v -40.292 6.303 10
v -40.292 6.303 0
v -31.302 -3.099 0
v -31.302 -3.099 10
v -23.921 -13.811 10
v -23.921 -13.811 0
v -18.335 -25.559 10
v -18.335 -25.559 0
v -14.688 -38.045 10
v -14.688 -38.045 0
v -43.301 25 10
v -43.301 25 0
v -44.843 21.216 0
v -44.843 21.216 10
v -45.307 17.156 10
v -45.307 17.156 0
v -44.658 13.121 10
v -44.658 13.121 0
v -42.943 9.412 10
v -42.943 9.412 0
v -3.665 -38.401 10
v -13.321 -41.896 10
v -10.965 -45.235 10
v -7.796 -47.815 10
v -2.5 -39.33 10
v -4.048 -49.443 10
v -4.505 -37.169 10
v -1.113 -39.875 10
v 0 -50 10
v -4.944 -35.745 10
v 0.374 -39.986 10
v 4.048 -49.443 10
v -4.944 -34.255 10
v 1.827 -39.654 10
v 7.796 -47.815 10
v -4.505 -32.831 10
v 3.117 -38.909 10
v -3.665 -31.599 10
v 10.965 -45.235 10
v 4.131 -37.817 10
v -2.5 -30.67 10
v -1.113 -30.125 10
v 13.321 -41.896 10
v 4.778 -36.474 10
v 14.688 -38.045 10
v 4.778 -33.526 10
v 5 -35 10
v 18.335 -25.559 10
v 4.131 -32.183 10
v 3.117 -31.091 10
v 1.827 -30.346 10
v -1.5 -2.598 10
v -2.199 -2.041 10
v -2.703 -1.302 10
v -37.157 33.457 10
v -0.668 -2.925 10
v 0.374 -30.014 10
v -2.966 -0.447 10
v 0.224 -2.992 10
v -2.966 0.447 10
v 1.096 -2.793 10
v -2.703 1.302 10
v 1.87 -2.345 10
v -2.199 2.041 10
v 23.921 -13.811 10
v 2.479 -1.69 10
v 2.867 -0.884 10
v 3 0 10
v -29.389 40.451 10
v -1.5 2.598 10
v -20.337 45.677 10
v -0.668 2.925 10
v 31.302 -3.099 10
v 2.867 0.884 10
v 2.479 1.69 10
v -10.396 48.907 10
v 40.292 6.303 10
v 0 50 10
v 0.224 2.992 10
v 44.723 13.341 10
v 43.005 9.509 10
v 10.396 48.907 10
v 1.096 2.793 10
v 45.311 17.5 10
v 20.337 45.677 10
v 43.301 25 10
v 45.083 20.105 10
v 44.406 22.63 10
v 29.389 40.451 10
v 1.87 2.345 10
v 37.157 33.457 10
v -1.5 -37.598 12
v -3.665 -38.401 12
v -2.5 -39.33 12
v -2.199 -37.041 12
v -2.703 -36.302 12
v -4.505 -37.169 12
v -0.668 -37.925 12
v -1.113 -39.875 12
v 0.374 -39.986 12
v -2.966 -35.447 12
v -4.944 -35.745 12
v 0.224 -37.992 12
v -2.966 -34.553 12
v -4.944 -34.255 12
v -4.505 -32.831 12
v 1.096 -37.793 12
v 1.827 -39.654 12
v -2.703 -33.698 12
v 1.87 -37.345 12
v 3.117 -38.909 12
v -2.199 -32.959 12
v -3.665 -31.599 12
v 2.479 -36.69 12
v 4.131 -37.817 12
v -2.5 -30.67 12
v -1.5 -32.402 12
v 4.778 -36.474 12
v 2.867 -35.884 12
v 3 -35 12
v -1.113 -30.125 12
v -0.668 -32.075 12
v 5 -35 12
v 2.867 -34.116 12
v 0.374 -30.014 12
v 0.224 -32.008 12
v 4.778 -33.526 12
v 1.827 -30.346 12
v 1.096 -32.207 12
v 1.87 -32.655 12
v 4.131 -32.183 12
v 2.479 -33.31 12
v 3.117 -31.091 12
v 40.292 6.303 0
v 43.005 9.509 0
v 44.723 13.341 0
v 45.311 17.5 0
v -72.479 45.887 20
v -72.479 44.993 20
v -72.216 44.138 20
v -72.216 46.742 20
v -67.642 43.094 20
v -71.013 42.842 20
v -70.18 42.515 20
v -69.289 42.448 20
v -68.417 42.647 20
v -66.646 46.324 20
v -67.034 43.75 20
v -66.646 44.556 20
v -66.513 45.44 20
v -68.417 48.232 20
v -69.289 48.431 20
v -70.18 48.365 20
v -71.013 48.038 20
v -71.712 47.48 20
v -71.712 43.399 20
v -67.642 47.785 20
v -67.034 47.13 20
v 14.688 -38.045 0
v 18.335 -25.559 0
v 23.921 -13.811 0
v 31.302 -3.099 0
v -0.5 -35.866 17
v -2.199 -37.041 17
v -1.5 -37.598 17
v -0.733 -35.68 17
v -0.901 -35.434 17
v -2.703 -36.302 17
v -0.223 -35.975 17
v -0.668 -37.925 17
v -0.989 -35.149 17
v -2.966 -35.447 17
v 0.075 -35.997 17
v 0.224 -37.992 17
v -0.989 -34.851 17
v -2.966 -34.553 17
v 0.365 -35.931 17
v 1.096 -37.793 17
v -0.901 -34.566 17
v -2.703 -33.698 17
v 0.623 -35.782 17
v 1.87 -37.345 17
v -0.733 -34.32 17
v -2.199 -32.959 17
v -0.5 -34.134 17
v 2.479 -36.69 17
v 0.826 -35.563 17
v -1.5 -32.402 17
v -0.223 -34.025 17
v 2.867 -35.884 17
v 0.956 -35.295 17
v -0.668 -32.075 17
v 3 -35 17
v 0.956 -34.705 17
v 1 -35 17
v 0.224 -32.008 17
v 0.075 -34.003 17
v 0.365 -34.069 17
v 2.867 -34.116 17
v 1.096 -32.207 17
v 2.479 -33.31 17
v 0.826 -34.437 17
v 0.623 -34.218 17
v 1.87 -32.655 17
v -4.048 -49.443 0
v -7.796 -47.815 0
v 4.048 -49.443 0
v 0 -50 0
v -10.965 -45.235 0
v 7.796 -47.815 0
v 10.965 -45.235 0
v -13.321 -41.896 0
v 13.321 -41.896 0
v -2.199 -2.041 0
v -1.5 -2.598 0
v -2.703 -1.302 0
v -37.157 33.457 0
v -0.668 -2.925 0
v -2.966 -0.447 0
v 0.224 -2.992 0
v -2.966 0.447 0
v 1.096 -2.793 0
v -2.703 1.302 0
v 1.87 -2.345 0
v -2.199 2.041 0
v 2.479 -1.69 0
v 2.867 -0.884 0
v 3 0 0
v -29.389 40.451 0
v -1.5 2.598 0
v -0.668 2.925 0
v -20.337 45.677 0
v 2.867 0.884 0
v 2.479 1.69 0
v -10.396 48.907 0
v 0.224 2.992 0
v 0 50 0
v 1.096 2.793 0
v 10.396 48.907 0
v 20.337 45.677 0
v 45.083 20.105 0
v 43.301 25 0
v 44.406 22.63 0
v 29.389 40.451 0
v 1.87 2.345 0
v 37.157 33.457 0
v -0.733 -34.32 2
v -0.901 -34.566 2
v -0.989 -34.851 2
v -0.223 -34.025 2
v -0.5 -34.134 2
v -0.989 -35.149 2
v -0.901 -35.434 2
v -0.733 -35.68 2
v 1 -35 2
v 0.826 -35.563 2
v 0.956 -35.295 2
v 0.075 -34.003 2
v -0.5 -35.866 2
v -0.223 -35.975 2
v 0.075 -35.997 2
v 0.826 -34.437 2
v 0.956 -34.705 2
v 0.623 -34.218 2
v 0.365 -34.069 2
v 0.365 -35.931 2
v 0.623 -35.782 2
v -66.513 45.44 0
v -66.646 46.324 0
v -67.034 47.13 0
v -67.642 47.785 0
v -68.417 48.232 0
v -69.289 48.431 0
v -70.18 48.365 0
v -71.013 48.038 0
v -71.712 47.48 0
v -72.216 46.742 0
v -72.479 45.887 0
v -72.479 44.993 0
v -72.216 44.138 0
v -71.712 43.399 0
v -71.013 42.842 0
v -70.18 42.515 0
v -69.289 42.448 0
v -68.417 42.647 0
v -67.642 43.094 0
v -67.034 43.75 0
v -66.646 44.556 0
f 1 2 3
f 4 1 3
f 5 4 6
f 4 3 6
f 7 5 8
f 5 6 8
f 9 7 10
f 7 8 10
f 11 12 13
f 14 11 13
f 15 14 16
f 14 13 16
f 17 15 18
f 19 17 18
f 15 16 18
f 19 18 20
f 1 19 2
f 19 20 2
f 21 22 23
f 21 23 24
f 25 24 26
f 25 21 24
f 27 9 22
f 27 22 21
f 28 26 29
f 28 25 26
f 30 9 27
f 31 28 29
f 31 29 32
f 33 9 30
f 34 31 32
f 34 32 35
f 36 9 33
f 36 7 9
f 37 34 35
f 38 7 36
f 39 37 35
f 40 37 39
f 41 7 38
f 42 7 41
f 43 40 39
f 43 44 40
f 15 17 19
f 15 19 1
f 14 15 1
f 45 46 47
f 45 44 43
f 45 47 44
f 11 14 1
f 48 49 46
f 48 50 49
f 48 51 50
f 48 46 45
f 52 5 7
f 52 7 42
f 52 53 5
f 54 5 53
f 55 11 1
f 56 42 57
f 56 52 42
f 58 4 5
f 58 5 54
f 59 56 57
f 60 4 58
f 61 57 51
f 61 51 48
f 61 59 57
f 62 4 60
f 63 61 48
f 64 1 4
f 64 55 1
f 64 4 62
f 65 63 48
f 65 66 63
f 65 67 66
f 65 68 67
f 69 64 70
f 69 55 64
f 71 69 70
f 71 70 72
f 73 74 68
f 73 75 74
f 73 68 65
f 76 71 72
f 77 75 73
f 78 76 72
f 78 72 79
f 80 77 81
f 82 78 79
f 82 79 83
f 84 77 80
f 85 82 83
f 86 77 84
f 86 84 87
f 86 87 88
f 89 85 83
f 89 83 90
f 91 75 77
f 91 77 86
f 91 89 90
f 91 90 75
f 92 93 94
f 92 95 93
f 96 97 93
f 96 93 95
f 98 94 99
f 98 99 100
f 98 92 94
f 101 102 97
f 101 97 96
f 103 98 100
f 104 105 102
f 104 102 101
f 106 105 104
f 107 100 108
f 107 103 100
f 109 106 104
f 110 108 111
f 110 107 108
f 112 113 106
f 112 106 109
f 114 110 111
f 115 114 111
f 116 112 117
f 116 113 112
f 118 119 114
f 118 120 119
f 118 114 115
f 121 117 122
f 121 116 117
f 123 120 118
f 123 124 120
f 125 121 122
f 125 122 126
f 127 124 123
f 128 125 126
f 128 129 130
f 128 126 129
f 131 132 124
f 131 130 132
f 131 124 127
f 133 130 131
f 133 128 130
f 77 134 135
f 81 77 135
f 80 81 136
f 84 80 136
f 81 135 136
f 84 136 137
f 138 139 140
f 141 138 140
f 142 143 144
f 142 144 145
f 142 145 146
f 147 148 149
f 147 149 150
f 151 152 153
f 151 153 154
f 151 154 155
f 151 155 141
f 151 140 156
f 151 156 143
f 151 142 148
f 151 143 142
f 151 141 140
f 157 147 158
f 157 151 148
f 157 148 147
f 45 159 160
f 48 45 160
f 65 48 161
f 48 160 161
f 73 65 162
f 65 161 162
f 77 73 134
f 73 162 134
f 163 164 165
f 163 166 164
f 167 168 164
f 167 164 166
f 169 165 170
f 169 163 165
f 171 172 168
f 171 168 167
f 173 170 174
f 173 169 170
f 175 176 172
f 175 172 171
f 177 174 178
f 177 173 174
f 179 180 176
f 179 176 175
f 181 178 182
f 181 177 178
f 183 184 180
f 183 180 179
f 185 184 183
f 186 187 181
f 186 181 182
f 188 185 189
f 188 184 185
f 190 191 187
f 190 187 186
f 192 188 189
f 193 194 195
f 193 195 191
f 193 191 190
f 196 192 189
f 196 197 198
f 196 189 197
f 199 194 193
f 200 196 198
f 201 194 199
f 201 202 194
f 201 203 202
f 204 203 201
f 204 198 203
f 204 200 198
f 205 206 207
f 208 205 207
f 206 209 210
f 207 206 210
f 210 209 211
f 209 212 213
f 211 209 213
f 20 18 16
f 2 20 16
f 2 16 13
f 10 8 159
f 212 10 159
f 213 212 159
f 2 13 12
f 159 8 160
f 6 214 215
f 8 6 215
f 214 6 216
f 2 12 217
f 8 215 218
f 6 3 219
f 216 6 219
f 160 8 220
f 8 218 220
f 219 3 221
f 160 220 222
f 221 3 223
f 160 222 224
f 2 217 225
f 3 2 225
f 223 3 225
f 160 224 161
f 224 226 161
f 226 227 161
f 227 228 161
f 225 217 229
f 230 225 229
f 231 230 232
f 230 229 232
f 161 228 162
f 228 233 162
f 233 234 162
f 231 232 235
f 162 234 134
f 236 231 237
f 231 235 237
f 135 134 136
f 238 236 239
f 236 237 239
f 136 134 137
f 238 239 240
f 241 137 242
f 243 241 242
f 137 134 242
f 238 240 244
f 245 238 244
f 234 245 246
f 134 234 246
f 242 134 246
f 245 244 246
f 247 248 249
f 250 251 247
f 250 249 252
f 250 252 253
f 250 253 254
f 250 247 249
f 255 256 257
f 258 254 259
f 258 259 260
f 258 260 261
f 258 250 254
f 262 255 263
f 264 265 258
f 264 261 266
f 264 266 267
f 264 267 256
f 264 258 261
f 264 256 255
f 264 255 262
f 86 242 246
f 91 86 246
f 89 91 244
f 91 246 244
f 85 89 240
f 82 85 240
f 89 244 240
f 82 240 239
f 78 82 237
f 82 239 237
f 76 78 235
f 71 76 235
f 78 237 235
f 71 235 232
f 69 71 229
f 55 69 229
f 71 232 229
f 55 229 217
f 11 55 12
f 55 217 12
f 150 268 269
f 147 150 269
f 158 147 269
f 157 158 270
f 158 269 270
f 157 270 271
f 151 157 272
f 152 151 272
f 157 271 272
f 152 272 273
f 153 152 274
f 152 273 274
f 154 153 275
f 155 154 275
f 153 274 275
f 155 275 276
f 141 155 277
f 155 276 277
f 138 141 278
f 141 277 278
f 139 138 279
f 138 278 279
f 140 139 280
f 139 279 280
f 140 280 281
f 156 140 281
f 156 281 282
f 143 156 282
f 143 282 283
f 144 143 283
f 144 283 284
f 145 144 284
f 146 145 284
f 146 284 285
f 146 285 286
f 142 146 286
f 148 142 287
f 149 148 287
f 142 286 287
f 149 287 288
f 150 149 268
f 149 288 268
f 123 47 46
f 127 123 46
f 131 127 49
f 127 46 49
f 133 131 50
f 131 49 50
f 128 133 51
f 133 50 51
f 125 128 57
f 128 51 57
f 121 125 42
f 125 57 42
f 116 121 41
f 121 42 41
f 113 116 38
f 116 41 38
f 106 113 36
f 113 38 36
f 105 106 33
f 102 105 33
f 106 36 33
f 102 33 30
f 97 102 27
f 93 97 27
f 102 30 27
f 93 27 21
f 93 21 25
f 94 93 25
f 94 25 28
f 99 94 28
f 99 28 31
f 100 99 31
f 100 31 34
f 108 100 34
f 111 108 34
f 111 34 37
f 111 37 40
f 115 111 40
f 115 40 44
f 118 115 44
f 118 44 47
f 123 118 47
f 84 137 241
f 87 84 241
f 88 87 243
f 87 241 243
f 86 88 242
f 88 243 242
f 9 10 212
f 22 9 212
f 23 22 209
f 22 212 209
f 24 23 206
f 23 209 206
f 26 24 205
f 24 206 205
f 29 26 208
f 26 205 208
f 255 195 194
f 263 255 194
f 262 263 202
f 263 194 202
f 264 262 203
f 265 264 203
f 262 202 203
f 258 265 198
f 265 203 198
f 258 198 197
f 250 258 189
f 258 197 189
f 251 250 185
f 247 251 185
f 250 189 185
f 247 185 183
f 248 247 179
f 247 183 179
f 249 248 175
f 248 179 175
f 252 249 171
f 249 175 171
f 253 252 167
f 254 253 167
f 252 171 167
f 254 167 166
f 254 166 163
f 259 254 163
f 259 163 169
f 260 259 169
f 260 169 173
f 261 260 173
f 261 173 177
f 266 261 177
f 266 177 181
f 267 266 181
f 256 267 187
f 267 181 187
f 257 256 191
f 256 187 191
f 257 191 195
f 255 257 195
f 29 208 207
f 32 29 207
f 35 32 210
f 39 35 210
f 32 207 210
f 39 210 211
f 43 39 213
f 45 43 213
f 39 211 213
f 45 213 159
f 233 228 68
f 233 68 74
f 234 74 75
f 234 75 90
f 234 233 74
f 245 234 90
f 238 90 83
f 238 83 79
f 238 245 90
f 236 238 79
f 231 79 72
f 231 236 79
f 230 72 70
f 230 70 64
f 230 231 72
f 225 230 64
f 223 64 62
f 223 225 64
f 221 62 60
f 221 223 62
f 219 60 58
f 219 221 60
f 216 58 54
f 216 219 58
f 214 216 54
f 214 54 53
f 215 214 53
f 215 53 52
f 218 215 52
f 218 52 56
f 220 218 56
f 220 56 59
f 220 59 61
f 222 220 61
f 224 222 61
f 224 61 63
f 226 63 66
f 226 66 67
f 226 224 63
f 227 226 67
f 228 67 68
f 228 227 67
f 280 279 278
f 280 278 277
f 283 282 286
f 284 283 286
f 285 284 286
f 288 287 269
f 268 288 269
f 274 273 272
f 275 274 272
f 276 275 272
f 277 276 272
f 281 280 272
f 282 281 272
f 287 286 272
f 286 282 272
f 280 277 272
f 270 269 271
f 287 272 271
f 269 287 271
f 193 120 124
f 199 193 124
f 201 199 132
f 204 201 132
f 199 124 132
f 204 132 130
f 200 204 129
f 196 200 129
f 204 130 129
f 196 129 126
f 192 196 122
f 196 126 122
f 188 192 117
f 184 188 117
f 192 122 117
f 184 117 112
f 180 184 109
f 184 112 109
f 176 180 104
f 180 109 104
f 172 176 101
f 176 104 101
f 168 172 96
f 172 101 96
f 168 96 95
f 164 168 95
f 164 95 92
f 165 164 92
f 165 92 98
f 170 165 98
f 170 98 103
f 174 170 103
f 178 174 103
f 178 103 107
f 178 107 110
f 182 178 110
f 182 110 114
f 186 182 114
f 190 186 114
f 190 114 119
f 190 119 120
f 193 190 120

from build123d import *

# Parameters (mm, degrees)
F0_R     = 3
F0_R_2   = 5
F1_DEPTH = 10
F2_DEPTH = 12
F3_DEPTH = 17
F4_R     = 1
F5_DEPTH = 15
F6_DEPTH = 20


with BuildPart() as f1:
    # F0 (on Top) → F1 (new body)
    with BuildSketch(Plane.XY):
        with BuildLine():
            ThreePointArc((40.291671, 6.302501), (15.50151, 19.883757), (43.30127, 25))
            ThreePointArc((43.30127, 25), (0, 50), (-43.30127, 25))
            ThreePointArc((-43.30127, 25), (-26.428604, 31.988887), (-15.310889, 17.5))
            ThreePointArc((-15.310889, 17.5), (-24.175408, 3.8122), (-40.291671, 6.302501))
            ThreePointArc((-40.291671, 6.302501), (-23.920556, -13.81054), (-14.68771, -38.044861))
            ThreePointArc((-14.68771, -38.044861), (-1.530417, -20.078277), (15, -35))
            ThreePointArc((15, -35), (14.921723, -36.530417), (14.68771, -38.044861))
            ThreePointArc((14.68771, -38.044861), (23.920556, -13.81054), (40.291671, 6.302501))
        make_face()
        Circle(F0_R, mode=Mode.SUBTRACT)
        with BuildLine():
            ThreePointArc((-15.310889, 17.5), (-26.428604, 31.988887), (-43.30127, 25))
            ThreePointArc((-43.30127, 25), (-45.120268, 15.116243), (-40.291671, 6.302501))
            ThreePointArc((-40.291671, 6.302501), (-24.175408, 3.8122), (-15.310889, 17.5))
        make_face()
        with BuildLine():
            ThreePointArc((45.310889, 17.5), (44.799777, 21.382285), (43.30127, 25))
            ThreePointArc((43.30127, 25), (15.50151, 19.883757), (40.291671, 6.302501))
            ThreePointArc((40.291671, 6.302501), (43.998689, 11.364518), (45.310889, 17.5))
        make_face()
        with BuildLine():
            ThreePointArc((-14.68771, -38.044861), (-9.469083, -46.63342), (0, -50))
            ThreePointArc((0, -50), (9.469083, -46.63342), (14.68771, -38.044861))
            ThreePointArc((14.68771, -38.044861), (14.921723, -36.530417), (15, -35))
            ThreePointArc((15, -35), (-1.530417, -20.078277), (-14.68771, -38.044861))
        make_face()
        with Locations((0, -35)):
            Circle(F0_R_2, mode=Mode.SUBTRACT)
    extrude(amount=F1_DEPTH)

    # F0 (on Top) → F2 (join)
    with BuildSketch(Plane.XY):
        with Locations((0, -35)):
            Circle(F0_R_2)
        with Locations((0, -35)):
            Circle(F0_R, mode=Mode.SUBTRACT)
    extrude(amount=F2_DEPTH)

    # F0 (on Top) → F3 (join)
    with BuildSketch(Plane.XY):
        with Locations((0, -35)):
            Circle(F0_R)
    extrude(amount=F3_DEPTH)

    # F4 (on face) → F5 (cut)
    with BuildSketch(Plane.XY.offset(17)):
        with Locations((0, -35)):
            Circle(F4_R)
    extrude(amount=-F5_DEPTH, mode=Mode.SUBTRACT)


with BuildPart() as f6:
    # F0 (on Top) → F6 (new body)
    with BuildSketch(Plane.XY):
        with Locations((-69.51274, 45.439869)):
            Circle(F0_R)
    extrude(amount=F6_DEPTH)


solid = Compound([f1.part, f6.part])
